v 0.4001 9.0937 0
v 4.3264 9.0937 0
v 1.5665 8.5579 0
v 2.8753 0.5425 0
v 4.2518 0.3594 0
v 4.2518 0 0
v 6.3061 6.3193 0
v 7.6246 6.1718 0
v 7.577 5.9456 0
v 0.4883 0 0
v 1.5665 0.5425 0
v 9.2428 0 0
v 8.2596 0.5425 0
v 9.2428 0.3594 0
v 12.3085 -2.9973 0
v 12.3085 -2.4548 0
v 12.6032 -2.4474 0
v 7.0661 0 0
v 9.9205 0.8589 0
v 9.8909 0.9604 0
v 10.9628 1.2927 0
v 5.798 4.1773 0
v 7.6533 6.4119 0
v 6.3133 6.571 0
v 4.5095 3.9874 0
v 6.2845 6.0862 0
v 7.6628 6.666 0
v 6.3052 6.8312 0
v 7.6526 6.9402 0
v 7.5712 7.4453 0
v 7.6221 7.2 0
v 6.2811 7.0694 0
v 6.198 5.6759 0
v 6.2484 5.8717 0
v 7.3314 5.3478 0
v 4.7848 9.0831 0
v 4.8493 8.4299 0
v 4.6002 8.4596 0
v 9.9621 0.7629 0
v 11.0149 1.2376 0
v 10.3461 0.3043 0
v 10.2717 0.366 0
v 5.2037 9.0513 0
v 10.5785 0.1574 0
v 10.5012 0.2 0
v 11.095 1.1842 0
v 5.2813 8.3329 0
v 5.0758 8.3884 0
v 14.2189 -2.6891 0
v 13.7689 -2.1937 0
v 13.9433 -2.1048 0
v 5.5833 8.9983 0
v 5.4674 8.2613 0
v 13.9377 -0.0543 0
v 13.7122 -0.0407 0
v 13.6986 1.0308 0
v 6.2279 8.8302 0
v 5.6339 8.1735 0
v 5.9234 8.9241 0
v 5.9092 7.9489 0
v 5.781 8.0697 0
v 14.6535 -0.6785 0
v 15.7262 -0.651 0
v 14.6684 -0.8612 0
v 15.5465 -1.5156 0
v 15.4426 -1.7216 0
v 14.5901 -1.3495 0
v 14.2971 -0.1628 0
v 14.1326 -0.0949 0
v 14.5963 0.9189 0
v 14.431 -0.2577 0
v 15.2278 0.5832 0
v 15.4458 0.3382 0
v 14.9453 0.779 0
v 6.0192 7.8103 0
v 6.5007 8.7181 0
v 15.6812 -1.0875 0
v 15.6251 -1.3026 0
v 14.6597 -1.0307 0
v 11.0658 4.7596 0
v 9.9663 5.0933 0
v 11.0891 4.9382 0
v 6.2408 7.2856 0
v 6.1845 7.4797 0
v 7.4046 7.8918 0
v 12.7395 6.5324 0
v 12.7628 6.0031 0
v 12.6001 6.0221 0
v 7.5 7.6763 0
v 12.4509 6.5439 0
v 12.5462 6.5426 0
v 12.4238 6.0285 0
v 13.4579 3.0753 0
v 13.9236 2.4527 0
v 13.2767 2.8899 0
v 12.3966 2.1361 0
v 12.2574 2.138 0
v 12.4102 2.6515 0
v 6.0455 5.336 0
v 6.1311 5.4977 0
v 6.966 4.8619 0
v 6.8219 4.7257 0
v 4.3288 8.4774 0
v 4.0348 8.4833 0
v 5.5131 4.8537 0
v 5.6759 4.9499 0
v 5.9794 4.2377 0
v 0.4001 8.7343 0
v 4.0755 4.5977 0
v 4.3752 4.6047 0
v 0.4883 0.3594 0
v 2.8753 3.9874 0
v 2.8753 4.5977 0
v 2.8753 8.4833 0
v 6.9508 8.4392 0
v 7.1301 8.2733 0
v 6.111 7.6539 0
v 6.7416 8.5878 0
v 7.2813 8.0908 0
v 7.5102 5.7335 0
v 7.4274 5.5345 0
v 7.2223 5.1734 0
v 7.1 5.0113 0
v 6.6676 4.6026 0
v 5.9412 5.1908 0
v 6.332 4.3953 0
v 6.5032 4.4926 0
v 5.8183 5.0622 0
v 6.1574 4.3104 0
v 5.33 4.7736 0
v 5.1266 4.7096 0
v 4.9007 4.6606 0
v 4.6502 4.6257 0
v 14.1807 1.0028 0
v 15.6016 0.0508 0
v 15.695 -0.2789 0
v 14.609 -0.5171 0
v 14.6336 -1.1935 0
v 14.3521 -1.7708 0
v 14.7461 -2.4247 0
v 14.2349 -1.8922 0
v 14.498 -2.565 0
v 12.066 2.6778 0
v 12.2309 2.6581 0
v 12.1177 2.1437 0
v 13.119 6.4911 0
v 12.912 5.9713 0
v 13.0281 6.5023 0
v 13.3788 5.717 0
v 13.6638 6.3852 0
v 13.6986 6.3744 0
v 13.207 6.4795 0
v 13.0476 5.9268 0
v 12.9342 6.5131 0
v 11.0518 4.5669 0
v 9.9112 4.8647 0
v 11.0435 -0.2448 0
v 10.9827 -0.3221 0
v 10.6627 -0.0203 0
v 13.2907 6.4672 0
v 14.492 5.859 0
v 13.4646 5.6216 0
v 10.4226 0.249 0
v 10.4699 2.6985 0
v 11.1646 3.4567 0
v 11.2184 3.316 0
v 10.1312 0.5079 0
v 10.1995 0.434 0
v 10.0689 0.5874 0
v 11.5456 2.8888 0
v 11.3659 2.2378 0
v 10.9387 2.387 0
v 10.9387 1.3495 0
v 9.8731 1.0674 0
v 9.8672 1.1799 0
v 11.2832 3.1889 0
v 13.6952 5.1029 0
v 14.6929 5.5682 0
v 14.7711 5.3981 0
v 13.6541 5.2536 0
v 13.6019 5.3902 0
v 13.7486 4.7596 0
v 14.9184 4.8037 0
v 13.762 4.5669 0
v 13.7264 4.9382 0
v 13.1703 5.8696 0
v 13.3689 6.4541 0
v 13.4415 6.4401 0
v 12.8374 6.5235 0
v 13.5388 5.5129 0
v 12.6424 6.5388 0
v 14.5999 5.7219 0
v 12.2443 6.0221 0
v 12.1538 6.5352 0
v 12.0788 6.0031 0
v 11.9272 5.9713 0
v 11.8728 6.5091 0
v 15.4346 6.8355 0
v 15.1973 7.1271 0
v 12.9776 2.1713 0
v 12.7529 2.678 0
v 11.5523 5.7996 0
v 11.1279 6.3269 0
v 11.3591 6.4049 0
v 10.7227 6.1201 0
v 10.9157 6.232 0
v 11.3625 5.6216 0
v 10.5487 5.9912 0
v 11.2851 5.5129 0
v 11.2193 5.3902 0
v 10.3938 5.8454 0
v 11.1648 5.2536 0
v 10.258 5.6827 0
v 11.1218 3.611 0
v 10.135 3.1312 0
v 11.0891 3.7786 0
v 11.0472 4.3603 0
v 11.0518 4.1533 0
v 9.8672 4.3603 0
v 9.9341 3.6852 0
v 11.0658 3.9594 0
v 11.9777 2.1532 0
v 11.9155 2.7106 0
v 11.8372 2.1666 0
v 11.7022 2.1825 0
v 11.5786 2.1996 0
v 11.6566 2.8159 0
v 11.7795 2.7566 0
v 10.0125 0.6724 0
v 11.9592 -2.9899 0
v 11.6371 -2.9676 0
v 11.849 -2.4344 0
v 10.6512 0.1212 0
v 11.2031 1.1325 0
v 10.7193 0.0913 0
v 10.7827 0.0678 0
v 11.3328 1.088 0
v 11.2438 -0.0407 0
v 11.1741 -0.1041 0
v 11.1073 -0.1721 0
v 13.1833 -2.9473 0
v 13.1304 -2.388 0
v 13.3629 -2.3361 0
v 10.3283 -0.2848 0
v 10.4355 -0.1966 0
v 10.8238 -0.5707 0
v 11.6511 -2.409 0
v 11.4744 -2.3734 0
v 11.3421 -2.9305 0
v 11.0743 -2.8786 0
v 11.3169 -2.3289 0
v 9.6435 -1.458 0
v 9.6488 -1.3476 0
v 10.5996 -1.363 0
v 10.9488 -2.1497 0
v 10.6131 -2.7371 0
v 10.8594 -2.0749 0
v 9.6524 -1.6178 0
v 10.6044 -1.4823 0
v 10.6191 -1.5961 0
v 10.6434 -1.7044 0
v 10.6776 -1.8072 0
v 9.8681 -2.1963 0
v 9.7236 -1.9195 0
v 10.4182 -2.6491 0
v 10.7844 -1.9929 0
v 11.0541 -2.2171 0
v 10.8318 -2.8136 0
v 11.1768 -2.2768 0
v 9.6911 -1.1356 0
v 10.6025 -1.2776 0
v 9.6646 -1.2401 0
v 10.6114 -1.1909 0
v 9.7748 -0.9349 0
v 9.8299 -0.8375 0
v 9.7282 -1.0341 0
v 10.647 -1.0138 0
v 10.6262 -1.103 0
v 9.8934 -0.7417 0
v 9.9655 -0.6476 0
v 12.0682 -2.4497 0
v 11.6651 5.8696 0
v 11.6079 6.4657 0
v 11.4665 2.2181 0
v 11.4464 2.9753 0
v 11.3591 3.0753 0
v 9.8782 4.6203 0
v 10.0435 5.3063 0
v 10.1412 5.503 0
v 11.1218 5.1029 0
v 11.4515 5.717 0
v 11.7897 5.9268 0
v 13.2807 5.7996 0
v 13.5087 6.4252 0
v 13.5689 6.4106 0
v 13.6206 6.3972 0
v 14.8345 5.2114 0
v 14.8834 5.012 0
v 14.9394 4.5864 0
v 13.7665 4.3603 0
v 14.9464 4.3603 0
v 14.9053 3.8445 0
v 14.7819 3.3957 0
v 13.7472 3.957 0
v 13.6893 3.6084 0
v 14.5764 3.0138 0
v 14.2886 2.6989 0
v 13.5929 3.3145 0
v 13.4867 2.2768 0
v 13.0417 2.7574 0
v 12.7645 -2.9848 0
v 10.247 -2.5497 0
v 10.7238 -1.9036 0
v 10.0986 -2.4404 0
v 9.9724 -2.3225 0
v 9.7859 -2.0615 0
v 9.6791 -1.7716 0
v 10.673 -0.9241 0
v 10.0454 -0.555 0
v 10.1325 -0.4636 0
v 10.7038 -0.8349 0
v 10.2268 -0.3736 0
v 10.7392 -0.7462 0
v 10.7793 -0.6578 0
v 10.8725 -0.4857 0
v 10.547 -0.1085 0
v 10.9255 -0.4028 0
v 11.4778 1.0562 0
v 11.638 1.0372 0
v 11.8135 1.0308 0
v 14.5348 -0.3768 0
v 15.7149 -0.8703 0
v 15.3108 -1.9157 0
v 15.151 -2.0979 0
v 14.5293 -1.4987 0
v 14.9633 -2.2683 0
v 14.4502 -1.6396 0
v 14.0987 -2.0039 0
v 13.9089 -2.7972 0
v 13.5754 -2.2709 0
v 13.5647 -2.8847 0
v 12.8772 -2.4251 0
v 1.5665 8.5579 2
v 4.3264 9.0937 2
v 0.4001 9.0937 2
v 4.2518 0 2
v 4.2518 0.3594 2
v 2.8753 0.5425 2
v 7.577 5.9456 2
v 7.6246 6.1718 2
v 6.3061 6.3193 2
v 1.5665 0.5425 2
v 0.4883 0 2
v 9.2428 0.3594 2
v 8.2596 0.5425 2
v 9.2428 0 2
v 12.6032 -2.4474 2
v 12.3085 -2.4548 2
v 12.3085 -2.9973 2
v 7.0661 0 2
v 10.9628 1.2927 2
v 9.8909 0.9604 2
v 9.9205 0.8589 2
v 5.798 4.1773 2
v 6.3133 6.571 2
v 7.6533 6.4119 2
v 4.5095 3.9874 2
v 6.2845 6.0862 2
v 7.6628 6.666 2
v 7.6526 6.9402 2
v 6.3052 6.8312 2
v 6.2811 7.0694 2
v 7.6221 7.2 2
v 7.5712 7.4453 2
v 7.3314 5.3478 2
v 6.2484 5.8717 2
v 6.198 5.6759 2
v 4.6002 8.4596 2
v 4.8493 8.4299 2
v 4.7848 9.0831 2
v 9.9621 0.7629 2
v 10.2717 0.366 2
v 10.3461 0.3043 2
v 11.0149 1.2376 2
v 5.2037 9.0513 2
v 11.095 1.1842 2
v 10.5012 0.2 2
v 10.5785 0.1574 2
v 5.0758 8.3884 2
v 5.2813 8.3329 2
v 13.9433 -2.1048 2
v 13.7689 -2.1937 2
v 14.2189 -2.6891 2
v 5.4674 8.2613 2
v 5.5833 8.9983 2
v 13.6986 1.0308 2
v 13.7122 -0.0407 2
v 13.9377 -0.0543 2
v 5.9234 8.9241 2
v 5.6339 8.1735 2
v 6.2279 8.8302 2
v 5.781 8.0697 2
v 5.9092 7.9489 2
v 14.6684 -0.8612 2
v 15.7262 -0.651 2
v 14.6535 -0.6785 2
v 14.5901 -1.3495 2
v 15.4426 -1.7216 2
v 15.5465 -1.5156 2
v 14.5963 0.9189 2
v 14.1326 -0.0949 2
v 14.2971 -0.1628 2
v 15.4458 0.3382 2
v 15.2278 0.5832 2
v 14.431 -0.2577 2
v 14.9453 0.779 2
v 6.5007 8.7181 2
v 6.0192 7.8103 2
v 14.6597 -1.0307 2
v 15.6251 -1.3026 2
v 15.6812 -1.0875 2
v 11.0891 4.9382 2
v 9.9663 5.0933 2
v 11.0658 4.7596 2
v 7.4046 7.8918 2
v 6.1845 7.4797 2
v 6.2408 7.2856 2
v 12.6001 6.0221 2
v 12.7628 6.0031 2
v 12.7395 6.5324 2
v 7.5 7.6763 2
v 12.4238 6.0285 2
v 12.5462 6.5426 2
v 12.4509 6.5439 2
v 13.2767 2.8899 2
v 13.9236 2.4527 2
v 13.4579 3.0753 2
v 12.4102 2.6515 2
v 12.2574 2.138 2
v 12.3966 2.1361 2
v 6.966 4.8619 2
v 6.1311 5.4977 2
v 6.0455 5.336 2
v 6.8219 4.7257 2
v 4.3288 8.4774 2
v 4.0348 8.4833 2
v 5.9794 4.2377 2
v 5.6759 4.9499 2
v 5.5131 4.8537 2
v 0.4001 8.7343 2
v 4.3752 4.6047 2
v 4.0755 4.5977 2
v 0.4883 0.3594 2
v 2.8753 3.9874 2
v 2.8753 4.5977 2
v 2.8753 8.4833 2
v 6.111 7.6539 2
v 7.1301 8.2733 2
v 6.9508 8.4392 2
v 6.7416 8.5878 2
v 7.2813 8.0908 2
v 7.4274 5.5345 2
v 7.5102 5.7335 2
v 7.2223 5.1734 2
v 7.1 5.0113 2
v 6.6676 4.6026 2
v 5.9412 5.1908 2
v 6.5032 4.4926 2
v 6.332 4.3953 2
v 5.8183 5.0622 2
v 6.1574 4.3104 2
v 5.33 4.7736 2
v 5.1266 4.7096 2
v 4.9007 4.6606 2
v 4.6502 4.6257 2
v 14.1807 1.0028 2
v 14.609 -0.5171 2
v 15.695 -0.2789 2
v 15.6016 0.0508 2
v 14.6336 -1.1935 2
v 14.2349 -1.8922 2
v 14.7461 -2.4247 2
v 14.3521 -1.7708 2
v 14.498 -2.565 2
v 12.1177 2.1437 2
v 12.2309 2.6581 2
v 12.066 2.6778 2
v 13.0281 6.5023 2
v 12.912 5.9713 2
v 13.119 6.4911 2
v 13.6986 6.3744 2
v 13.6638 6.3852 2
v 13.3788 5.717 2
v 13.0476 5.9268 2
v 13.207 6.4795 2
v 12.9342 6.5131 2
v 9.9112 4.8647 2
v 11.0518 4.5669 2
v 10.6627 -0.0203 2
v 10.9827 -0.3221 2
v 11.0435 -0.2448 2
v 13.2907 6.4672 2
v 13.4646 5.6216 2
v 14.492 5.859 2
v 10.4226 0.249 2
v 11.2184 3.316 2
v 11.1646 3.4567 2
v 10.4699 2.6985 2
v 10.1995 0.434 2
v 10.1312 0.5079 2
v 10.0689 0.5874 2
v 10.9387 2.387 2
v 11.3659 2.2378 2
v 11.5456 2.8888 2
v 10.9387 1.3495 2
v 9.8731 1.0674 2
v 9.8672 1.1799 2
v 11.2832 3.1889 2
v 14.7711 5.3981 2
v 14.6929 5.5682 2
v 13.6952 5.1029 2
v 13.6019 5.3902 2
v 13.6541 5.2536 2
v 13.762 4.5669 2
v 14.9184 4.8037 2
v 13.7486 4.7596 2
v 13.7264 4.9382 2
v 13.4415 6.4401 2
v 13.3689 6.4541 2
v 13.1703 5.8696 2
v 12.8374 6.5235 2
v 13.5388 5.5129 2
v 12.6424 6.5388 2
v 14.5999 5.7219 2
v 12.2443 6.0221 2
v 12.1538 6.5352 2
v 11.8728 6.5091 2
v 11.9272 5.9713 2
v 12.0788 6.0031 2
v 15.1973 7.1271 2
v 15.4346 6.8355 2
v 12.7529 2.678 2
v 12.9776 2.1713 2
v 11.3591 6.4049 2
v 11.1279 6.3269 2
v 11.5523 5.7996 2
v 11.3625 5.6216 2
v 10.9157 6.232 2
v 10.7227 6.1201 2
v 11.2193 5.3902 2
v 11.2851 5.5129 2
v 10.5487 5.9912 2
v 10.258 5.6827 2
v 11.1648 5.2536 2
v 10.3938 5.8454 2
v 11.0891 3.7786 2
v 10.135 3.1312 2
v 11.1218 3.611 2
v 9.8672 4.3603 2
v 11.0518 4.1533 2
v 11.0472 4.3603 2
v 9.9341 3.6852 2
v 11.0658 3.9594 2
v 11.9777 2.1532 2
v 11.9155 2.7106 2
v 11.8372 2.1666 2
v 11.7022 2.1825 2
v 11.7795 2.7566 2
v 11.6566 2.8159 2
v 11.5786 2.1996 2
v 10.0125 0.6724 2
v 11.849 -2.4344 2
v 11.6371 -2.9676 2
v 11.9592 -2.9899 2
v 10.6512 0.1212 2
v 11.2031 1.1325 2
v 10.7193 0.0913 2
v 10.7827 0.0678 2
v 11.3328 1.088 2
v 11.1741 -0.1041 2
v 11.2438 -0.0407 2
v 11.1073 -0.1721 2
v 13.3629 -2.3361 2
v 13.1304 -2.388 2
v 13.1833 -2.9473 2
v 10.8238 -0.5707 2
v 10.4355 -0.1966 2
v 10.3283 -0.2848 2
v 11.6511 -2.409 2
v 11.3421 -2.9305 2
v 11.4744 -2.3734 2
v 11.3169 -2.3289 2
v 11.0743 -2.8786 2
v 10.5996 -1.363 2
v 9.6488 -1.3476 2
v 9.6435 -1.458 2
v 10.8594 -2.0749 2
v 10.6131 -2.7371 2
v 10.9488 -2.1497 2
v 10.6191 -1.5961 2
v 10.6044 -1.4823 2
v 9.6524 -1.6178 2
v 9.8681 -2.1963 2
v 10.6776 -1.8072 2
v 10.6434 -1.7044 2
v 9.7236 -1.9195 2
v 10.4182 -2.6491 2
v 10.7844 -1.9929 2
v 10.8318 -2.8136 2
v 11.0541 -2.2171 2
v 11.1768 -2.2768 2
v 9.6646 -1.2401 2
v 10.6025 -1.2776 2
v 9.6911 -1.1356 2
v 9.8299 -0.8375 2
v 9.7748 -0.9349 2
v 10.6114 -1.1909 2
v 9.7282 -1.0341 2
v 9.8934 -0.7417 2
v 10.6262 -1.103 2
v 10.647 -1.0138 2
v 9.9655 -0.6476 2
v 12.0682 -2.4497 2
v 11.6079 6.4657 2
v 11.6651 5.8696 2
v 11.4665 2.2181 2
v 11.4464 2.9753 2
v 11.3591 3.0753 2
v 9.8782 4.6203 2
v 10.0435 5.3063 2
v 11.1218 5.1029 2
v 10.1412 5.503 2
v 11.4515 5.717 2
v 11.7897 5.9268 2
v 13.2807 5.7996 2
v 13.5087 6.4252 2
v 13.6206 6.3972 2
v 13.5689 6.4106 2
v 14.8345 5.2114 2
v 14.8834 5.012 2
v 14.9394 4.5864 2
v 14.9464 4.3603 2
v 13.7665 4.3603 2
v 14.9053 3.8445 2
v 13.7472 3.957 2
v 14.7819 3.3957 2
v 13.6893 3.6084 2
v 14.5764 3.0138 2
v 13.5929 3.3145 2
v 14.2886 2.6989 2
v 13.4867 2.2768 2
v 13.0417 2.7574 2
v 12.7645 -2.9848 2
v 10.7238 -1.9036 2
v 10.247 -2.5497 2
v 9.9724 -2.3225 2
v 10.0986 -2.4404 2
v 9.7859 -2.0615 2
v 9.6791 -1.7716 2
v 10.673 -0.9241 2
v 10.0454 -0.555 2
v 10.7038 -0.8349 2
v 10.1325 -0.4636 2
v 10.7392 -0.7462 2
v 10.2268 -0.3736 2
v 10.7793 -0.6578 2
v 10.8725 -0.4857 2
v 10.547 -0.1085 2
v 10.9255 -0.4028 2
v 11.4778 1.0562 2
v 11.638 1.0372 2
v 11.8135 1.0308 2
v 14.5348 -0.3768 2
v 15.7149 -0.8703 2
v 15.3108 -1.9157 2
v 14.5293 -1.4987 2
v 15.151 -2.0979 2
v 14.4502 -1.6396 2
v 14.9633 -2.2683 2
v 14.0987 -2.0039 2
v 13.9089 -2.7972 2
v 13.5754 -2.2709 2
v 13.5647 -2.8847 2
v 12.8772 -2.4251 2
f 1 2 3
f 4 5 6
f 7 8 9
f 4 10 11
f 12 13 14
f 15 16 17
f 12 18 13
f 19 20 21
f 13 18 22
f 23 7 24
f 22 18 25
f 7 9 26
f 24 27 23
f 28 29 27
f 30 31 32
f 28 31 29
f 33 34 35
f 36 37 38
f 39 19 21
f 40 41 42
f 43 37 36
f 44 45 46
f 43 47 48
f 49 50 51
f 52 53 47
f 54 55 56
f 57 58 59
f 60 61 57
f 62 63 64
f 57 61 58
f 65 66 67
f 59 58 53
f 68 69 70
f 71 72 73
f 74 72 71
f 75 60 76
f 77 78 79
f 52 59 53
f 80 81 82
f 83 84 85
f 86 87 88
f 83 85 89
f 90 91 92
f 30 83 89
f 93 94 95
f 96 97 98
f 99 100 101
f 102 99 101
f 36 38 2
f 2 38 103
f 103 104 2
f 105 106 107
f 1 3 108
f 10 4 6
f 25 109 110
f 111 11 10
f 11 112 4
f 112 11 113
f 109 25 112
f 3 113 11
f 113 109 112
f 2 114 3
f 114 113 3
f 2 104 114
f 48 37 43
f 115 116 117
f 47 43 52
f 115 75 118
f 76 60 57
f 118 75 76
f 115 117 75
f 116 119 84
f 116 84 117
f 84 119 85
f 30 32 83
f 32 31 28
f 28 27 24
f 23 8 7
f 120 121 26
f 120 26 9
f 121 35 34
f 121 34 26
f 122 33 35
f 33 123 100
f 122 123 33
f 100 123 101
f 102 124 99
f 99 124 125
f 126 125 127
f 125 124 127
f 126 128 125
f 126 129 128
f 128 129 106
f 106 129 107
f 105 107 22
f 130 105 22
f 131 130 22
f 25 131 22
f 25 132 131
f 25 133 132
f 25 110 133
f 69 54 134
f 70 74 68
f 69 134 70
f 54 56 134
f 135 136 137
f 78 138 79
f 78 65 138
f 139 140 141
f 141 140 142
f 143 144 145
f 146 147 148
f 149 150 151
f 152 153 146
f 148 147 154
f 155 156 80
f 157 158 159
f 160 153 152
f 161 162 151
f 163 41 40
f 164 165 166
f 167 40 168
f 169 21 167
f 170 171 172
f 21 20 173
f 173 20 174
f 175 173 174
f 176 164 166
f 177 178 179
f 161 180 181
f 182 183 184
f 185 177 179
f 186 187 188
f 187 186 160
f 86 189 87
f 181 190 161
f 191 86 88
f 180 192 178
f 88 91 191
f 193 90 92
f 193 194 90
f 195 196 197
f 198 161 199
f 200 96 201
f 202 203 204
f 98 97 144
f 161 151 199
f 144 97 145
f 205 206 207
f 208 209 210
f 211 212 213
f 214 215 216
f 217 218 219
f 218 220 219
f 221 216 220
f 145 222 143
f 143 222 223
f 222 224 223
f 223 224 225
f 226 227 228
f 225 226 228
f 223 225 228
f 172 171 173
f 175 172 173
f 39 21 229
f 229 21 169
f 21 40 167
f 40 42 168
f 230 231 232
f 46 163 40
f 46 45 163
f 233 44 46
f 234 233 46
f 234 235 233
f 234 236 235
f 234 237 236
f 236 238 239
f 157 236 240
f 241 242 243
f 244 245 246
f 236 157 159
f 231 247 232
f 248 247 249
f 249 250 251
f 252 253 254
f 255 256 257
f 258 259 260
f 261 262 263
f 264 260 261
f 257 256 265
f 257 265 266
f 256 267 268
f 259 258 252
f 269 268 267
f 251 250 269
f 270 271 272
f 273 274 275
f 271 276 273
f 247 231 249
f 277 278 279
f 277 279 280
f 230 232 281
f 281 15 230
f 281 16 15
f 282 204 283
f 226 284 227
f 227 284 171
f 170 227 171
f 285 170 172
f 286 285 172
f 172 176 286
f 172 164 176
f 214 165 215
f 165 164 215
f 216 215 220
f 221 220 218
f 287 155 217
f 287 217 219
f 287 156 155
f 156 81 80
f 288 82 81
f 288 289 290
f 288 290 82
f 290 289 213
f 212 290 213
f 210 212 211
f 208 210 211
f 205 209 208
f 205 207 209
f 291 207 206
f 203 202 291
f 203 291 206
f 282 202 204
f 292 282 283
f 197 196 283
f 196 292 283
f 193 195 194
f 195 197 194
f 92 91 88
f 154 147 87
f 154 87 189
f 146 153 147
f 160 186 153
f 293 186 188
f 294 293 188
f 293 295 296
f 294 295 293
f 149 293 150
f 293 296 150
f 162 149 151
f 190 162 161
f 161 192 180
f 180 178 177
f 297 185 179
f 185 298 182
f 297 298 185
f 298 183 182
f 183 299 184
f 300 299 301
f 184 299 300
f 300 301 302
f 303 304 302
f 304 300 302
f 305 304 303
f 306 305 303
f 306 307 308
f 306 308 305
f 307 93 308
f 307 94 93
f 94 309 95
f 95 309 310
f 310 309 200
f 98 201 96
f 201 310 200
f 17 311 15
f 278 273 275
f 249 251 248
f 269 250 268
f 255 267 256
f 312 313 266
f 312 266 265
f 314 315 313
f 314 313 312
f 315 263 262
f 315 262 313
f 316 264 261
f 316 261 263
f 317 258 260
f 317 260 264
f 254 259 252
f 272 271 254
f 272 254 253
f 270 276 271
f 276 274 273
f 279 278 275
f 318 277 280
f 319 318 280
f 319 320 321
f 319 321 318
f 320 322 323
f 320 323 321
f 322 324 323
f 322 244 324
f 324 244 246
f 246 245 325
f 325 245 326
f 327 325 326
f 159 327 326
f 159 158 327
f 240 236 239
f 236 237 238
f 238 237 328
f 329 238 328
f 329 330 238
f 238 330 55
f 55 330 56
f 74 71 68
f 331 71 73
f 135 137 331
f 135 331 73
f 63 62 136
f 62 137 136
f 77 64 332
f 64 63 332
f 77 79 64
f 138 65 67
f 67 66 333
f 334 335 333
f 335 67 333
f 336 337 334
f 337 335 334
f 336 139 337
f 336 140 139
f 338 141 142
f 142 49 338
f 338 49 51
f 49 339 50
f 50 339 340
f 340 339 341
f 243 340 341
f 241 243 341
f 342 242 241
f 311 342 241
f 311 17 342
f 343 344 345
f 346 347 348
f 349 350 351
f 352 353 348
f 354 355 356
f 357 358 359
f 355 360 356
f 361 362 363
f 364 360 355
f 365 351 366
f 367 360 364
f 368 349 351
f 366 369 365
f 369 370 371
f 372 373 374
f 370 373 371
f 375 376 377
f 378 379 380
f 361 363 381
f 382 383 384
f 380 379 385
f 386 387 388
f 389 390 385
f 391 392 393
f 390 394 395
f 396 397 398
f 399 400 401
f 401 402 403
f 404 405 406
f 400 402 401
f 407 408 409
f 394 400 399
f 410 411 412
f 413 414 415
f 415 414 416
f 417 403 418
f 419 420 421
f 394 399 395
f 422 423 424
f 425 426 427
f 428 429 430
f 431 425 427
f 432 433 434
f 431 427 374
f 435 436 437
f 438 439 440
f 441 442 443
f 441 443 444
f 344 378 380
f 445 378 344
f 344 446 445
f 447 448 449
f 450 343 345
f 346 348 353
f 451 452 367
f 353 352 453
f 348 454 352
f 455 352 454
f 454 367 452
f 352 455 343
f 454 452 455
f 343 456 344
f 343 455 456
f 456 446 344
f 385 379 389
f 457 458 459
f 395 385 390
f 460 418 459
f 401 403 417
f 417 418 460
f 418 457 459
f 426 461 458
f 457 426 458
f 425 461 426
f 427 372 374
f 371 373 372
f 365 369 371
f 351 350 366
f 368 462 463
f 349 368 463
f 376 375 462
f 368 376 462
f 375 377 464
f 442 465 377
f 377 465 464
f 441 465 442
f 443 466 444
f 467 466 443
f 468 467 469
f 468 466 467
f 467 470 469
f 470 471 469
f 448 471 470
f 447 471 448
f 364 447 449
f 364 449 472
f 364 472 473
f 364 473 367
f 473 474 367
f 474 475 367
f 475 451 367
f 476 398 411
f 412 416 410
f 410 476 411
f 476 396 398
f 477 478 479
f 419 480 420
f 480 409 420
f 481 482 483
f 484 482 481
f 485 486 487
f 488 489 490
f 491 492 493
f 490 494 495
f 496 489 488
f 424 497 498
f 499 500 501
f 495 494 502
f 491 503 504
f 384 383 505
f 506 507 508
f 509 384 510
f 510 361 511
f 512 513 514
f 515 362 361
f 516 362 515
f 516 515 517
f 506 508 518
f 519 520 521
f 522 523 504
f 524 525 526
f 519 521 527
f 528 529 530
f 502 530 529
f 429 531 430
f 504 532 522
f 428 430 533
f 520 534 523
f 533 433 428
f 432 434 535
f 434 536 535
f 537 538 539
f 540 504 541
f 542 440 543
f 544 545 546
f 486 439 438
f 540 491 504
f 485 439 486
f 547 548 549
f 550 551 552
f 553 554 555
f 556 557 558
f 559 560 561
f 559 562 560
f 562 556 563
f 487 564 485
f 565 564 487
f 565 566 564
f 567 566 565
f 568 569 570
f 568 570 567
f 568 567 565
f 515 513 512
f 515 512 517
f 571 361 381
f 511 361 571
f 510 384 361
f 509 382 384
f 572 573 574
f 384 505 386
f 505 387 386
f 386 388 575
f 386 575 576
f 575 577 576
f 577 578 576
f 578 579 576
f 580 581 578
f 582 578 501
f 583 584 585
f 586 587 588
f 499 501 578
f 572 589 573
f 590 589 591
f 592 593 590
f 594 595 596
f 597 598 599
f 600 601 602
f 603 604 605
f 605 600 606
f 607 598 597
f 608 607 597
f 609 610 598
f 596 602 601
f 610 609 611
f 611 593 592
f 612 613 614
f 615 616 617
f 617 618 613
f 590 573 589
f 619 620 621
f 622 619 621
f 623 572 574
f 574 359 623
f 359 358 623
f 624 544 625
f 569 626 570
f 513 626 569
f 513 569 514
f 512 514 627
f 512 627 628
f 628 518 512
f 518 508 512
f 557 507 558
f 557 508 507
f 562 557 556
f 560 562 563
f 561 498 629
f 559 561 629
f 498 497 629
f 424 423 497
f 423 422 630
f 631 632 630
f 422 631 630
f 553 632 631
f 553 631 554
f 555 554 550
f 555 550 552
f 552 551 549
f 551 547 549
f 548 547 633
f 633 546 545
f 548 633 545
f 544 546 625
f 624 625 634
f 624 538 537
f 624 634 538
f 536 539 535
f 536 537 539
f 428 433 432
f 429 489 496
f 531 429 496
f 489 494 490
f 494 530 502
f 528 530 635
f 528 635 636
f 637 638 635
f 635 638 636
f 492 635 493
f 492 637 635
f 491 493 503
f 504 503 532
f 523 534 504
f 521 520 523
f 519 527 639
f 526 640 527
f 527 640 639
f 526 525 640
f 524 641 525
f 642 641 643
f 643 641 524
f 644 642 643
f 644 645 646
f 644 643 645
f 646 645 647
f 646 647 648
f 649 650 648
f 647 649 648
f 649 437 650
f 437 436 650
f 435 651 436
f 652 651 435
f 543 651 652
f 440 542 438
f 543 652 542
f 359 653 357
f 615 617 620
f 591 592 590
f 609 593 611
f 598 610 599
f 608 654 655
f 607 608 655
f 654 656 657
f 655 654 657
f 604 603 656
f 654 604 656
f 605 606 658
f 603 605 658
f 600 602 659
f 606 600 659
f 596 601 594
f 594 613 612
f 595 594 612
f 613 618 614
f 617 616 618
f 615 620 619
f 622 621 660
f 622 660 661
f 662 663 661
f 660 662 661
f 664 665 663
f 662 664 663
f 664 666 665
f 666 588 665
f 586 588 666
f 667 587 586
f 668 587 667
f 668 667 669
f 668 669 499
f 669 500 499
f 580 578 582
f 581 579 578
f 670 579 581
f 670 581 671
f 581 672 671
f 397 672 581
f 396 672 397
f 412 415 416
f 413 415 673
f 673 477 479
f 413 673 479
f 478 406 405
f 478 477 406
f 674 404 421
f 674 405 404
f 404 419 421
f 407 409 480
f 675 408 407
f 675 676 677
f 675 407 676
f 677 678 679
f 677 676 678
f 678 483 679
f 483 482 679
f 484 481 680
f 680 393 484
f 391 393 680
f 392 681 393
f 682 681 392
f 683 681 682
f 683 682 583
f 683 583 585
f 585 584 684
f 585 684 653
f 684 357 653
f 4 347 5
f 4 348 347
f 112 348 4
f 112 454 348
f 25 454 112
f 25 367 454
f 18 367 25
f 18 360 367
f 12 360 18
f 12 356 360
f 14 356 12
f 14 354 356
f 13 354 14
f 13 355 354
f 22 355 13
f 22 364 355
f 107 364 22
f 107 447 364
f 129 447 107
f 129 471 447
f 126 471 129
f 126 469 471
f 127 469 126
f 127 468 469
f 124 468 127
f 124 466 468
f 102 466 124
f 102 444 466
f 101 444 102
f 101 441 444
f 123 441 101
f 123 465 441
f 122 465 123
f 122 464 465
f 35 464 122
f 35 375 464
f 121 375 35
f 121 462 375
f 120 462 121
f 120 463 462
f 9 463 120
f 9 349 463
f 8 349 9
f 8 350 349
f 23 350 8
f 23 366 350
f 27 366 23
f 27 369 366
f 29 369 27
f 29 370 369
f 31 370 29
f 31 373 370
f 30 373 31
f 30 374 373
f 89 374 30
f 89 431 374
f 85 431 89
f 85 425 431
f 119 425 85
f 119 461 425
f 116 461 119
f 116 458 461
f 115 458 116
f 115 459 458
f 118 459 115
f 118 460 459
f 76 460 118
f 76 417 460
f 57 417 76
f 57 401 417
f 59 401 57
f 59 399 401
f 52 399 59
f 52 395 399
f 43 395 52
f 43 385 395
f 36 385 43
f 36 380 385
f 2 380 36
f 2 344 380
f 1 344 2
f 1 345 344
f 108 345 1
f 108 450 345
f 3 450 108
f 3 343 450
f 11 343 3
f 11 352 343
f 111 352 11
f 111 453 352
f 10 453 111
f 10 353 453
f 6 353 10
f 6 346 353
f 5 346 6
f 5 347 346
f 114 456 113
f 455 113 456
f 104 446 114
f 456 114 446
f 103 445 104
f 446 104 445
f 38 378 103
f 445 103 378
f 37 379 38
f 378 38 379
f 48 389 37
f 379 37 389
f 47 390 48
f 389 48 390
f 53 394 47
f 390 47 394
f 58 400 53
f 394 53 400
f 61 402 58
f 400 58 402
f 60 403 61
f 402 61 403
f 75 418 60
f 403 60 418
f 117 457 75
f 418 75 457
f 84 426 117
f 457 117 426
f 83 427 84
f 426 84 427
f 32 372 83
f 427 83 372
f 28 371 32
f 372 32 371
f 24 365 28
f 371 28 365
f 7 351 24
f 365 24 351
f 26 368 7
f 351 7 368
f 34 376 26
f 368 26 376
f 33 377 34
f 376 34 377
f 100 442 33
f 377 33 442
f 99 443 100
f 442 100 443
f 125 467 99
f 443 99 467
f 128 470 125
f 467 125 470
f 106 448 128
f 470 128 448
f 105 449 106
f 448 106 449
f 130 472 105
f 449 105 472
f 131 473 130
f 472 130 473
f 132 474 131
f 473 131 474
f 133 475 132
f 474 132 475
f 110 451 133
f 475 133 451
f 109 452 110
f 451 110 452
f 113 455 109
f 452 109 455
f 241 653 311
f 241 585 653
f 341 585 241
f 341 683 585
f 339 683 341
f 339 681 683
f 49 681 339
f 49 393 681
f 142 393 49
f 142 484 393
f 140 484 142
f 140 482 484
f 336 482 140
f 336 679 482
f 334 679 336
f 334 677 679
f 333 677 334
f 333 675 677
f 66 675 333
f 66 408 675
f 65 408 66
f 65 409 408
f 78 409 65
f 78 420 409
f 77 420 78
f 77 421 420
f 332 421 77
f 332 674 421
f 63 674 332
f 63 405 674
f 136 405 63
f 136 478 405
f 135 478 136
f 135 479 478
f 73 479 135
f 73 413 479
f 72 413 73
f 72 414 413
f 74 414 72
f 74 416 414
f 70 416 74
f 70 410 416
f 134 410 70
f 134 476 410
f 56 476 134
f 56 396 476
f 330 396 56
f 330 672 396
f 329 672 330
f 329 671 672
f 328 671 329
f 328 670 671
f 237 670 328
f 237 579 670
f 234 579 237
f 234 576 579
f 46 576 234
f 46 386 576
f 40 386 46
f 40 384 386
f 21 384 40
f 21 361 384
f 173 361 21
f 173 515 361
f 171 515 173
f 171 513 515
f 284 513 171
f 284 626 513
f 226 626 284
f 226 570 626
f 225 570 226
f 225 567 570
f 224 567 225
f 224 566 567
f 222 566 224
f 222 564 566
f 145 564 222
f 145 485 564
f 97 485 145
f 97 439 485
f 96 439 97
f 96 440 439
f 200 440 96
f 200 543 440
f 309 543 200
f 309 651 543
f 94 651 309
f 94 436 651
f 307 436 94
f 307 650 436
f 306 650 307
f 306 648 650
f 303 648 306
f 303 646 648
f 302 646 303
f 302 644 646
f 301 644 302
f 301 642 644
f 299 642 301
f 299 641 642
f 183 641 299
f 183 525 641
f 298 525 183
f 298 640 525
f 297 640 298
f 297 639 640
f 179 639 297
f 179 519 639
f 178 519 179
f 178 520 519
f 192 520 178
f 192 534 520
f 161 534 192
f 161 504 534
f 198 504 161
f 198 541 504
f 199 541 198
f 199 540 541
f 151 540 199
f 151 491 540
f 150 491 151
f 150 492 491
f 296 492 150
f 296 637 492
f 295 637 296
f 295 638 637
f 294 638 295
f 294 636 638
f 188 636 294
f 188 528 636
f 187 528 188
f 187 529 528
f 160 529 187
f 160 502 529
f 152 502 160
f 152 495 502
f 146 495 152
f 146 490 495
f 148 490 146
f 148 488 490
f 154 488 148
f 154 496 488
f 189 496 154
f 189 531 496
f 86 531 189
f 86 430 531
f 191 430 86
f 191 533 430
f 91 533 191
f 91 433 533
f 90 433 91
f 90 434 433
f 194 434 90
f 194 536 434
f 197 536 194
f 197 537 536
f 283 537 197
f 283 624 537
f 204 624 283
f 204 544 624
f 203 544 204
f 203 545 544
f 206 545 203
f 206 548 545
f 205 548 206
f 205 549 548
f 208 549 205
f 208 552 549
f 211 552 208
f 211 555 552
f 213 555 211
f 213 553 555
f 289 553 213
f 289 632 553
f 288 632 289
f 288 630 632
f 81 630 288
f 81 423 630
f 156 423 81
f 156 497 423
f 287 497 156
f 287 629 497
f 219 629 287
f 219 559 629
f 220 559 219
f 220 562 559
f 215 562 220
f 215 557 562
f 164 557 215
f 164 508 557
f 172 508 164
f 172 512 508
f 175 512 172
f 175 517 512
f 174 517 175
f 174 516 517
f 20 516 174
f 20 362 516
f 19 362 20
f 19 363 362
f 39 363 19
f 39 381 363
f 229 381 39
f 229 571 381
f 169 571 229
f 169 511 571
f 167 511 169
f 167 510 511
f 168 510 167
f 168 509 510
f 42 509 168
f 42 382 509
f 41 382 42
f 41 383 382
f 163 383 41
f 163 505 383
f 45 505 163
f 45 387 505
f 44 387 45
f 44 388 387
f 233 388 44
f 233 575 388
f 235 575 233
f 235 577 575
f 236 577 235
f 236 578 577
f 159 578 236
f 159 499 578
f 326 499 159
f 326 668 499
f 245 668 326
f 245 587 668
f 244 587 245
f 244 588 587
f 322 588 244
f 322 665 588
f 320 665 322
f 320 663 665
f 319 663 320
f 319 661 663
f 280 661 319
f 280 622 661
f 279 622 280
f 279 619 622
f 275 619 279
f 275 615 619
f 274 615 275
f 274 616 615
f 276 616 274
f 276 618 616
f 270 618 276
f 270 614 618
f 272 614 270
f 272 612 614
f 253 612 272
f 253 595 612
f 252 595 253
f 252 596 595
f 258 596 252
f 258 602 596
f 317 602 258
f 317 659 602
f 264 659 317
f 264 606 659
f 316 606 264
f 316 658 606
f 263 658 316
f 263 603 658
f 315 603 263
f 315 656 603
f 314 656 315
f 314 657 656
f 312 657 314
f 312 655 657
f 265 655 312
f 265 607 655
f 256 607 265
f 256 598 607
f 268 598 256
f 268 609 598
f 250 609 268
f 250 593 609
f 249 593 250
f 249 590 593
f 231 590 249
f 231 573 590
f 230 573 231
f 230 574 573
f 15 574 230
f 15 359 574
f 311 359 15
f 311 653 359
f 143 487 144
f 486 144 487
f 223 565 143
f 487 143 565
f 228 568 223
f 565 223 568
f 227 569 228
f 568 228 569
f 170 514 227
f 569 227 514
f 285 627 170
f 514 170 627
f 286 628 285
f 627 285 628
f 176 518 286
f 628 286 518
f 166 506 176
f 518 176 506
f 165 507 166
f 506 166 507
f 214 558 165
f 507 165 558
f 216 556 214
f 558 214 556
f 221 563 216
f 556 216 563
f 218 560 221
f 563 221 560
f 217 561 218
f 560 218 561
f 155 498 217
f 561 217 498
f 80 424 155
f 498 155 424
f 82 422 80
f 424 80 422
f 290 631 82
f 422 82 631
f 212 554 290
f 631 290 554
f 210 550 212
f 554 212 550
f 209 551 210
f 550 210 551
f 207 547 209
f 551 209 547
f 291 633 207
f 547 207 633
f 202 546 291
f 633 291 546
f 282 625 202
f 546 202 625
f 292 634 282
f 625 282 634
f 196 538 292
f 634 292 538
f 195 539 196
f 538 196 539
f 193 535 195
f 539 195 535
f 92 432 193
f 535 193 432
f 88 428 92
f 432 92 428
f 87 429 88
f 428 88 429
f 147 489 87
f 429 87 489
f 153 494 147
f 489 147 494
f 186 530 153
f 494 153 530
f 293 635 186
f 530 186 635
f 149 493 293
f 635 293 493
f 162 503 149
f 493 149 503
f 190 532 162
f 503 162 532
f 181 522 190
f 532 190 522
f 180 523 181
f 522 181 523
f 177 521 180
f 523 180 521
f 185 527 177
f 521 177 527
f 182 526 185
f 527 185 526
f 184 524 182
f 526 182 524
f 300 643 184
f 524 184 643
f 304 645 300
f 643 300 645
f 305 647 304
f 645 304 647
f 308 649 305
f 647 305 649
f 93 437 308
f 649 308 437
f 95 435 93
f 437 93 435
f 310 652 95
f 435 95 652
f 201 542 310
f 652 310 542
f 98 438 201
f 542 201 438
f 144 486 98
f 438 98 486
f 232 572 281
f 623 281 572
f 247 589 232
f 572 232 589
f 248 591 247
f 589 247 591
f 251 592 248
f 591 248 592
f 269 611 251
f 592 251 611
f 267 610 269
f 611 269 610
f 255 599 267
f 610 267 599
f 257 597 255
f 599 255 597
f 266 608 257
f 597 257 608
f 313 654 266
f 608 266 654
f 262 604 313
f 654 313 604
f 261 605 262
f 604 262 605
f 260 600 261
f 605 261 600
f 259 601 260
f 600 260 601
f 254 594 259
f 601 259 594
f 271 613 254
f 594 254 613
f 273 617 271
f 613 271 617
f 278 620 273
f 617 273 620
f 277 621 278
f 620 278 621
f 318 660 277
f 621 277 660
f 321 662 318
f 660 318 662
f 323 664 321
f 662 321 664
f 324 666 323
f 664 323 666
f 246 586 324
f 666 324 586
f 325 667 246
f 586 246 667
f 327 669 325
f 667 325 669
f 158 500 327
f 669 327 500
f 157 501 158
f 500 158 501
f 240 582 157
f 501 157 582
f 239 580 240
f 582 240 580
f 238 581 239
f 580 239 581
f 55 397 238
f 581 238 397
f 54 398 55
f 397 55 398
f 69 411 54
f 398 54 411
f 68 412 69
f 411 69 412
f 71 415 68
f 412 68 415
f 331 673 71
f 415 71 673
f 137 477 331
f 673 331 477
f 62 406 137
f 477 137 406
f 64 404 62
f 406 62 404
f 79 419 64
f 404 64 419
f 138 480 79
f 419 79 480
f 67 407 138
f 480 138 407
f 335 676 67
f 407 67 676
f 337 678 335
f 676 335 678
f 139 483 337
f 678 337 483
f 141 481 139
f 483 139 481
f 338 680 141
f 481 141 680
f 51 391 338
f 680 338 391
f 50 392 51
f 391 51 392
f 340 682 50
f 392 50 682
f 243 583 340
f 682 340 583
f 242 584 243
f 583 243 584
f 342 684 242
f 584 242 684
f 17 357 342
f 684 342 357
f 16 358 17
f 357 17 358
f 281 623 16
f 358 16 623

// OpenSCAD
// oracle: vol-tol 0.005
linear_extrude(2) text("Rg", font="Liberation Serif");
